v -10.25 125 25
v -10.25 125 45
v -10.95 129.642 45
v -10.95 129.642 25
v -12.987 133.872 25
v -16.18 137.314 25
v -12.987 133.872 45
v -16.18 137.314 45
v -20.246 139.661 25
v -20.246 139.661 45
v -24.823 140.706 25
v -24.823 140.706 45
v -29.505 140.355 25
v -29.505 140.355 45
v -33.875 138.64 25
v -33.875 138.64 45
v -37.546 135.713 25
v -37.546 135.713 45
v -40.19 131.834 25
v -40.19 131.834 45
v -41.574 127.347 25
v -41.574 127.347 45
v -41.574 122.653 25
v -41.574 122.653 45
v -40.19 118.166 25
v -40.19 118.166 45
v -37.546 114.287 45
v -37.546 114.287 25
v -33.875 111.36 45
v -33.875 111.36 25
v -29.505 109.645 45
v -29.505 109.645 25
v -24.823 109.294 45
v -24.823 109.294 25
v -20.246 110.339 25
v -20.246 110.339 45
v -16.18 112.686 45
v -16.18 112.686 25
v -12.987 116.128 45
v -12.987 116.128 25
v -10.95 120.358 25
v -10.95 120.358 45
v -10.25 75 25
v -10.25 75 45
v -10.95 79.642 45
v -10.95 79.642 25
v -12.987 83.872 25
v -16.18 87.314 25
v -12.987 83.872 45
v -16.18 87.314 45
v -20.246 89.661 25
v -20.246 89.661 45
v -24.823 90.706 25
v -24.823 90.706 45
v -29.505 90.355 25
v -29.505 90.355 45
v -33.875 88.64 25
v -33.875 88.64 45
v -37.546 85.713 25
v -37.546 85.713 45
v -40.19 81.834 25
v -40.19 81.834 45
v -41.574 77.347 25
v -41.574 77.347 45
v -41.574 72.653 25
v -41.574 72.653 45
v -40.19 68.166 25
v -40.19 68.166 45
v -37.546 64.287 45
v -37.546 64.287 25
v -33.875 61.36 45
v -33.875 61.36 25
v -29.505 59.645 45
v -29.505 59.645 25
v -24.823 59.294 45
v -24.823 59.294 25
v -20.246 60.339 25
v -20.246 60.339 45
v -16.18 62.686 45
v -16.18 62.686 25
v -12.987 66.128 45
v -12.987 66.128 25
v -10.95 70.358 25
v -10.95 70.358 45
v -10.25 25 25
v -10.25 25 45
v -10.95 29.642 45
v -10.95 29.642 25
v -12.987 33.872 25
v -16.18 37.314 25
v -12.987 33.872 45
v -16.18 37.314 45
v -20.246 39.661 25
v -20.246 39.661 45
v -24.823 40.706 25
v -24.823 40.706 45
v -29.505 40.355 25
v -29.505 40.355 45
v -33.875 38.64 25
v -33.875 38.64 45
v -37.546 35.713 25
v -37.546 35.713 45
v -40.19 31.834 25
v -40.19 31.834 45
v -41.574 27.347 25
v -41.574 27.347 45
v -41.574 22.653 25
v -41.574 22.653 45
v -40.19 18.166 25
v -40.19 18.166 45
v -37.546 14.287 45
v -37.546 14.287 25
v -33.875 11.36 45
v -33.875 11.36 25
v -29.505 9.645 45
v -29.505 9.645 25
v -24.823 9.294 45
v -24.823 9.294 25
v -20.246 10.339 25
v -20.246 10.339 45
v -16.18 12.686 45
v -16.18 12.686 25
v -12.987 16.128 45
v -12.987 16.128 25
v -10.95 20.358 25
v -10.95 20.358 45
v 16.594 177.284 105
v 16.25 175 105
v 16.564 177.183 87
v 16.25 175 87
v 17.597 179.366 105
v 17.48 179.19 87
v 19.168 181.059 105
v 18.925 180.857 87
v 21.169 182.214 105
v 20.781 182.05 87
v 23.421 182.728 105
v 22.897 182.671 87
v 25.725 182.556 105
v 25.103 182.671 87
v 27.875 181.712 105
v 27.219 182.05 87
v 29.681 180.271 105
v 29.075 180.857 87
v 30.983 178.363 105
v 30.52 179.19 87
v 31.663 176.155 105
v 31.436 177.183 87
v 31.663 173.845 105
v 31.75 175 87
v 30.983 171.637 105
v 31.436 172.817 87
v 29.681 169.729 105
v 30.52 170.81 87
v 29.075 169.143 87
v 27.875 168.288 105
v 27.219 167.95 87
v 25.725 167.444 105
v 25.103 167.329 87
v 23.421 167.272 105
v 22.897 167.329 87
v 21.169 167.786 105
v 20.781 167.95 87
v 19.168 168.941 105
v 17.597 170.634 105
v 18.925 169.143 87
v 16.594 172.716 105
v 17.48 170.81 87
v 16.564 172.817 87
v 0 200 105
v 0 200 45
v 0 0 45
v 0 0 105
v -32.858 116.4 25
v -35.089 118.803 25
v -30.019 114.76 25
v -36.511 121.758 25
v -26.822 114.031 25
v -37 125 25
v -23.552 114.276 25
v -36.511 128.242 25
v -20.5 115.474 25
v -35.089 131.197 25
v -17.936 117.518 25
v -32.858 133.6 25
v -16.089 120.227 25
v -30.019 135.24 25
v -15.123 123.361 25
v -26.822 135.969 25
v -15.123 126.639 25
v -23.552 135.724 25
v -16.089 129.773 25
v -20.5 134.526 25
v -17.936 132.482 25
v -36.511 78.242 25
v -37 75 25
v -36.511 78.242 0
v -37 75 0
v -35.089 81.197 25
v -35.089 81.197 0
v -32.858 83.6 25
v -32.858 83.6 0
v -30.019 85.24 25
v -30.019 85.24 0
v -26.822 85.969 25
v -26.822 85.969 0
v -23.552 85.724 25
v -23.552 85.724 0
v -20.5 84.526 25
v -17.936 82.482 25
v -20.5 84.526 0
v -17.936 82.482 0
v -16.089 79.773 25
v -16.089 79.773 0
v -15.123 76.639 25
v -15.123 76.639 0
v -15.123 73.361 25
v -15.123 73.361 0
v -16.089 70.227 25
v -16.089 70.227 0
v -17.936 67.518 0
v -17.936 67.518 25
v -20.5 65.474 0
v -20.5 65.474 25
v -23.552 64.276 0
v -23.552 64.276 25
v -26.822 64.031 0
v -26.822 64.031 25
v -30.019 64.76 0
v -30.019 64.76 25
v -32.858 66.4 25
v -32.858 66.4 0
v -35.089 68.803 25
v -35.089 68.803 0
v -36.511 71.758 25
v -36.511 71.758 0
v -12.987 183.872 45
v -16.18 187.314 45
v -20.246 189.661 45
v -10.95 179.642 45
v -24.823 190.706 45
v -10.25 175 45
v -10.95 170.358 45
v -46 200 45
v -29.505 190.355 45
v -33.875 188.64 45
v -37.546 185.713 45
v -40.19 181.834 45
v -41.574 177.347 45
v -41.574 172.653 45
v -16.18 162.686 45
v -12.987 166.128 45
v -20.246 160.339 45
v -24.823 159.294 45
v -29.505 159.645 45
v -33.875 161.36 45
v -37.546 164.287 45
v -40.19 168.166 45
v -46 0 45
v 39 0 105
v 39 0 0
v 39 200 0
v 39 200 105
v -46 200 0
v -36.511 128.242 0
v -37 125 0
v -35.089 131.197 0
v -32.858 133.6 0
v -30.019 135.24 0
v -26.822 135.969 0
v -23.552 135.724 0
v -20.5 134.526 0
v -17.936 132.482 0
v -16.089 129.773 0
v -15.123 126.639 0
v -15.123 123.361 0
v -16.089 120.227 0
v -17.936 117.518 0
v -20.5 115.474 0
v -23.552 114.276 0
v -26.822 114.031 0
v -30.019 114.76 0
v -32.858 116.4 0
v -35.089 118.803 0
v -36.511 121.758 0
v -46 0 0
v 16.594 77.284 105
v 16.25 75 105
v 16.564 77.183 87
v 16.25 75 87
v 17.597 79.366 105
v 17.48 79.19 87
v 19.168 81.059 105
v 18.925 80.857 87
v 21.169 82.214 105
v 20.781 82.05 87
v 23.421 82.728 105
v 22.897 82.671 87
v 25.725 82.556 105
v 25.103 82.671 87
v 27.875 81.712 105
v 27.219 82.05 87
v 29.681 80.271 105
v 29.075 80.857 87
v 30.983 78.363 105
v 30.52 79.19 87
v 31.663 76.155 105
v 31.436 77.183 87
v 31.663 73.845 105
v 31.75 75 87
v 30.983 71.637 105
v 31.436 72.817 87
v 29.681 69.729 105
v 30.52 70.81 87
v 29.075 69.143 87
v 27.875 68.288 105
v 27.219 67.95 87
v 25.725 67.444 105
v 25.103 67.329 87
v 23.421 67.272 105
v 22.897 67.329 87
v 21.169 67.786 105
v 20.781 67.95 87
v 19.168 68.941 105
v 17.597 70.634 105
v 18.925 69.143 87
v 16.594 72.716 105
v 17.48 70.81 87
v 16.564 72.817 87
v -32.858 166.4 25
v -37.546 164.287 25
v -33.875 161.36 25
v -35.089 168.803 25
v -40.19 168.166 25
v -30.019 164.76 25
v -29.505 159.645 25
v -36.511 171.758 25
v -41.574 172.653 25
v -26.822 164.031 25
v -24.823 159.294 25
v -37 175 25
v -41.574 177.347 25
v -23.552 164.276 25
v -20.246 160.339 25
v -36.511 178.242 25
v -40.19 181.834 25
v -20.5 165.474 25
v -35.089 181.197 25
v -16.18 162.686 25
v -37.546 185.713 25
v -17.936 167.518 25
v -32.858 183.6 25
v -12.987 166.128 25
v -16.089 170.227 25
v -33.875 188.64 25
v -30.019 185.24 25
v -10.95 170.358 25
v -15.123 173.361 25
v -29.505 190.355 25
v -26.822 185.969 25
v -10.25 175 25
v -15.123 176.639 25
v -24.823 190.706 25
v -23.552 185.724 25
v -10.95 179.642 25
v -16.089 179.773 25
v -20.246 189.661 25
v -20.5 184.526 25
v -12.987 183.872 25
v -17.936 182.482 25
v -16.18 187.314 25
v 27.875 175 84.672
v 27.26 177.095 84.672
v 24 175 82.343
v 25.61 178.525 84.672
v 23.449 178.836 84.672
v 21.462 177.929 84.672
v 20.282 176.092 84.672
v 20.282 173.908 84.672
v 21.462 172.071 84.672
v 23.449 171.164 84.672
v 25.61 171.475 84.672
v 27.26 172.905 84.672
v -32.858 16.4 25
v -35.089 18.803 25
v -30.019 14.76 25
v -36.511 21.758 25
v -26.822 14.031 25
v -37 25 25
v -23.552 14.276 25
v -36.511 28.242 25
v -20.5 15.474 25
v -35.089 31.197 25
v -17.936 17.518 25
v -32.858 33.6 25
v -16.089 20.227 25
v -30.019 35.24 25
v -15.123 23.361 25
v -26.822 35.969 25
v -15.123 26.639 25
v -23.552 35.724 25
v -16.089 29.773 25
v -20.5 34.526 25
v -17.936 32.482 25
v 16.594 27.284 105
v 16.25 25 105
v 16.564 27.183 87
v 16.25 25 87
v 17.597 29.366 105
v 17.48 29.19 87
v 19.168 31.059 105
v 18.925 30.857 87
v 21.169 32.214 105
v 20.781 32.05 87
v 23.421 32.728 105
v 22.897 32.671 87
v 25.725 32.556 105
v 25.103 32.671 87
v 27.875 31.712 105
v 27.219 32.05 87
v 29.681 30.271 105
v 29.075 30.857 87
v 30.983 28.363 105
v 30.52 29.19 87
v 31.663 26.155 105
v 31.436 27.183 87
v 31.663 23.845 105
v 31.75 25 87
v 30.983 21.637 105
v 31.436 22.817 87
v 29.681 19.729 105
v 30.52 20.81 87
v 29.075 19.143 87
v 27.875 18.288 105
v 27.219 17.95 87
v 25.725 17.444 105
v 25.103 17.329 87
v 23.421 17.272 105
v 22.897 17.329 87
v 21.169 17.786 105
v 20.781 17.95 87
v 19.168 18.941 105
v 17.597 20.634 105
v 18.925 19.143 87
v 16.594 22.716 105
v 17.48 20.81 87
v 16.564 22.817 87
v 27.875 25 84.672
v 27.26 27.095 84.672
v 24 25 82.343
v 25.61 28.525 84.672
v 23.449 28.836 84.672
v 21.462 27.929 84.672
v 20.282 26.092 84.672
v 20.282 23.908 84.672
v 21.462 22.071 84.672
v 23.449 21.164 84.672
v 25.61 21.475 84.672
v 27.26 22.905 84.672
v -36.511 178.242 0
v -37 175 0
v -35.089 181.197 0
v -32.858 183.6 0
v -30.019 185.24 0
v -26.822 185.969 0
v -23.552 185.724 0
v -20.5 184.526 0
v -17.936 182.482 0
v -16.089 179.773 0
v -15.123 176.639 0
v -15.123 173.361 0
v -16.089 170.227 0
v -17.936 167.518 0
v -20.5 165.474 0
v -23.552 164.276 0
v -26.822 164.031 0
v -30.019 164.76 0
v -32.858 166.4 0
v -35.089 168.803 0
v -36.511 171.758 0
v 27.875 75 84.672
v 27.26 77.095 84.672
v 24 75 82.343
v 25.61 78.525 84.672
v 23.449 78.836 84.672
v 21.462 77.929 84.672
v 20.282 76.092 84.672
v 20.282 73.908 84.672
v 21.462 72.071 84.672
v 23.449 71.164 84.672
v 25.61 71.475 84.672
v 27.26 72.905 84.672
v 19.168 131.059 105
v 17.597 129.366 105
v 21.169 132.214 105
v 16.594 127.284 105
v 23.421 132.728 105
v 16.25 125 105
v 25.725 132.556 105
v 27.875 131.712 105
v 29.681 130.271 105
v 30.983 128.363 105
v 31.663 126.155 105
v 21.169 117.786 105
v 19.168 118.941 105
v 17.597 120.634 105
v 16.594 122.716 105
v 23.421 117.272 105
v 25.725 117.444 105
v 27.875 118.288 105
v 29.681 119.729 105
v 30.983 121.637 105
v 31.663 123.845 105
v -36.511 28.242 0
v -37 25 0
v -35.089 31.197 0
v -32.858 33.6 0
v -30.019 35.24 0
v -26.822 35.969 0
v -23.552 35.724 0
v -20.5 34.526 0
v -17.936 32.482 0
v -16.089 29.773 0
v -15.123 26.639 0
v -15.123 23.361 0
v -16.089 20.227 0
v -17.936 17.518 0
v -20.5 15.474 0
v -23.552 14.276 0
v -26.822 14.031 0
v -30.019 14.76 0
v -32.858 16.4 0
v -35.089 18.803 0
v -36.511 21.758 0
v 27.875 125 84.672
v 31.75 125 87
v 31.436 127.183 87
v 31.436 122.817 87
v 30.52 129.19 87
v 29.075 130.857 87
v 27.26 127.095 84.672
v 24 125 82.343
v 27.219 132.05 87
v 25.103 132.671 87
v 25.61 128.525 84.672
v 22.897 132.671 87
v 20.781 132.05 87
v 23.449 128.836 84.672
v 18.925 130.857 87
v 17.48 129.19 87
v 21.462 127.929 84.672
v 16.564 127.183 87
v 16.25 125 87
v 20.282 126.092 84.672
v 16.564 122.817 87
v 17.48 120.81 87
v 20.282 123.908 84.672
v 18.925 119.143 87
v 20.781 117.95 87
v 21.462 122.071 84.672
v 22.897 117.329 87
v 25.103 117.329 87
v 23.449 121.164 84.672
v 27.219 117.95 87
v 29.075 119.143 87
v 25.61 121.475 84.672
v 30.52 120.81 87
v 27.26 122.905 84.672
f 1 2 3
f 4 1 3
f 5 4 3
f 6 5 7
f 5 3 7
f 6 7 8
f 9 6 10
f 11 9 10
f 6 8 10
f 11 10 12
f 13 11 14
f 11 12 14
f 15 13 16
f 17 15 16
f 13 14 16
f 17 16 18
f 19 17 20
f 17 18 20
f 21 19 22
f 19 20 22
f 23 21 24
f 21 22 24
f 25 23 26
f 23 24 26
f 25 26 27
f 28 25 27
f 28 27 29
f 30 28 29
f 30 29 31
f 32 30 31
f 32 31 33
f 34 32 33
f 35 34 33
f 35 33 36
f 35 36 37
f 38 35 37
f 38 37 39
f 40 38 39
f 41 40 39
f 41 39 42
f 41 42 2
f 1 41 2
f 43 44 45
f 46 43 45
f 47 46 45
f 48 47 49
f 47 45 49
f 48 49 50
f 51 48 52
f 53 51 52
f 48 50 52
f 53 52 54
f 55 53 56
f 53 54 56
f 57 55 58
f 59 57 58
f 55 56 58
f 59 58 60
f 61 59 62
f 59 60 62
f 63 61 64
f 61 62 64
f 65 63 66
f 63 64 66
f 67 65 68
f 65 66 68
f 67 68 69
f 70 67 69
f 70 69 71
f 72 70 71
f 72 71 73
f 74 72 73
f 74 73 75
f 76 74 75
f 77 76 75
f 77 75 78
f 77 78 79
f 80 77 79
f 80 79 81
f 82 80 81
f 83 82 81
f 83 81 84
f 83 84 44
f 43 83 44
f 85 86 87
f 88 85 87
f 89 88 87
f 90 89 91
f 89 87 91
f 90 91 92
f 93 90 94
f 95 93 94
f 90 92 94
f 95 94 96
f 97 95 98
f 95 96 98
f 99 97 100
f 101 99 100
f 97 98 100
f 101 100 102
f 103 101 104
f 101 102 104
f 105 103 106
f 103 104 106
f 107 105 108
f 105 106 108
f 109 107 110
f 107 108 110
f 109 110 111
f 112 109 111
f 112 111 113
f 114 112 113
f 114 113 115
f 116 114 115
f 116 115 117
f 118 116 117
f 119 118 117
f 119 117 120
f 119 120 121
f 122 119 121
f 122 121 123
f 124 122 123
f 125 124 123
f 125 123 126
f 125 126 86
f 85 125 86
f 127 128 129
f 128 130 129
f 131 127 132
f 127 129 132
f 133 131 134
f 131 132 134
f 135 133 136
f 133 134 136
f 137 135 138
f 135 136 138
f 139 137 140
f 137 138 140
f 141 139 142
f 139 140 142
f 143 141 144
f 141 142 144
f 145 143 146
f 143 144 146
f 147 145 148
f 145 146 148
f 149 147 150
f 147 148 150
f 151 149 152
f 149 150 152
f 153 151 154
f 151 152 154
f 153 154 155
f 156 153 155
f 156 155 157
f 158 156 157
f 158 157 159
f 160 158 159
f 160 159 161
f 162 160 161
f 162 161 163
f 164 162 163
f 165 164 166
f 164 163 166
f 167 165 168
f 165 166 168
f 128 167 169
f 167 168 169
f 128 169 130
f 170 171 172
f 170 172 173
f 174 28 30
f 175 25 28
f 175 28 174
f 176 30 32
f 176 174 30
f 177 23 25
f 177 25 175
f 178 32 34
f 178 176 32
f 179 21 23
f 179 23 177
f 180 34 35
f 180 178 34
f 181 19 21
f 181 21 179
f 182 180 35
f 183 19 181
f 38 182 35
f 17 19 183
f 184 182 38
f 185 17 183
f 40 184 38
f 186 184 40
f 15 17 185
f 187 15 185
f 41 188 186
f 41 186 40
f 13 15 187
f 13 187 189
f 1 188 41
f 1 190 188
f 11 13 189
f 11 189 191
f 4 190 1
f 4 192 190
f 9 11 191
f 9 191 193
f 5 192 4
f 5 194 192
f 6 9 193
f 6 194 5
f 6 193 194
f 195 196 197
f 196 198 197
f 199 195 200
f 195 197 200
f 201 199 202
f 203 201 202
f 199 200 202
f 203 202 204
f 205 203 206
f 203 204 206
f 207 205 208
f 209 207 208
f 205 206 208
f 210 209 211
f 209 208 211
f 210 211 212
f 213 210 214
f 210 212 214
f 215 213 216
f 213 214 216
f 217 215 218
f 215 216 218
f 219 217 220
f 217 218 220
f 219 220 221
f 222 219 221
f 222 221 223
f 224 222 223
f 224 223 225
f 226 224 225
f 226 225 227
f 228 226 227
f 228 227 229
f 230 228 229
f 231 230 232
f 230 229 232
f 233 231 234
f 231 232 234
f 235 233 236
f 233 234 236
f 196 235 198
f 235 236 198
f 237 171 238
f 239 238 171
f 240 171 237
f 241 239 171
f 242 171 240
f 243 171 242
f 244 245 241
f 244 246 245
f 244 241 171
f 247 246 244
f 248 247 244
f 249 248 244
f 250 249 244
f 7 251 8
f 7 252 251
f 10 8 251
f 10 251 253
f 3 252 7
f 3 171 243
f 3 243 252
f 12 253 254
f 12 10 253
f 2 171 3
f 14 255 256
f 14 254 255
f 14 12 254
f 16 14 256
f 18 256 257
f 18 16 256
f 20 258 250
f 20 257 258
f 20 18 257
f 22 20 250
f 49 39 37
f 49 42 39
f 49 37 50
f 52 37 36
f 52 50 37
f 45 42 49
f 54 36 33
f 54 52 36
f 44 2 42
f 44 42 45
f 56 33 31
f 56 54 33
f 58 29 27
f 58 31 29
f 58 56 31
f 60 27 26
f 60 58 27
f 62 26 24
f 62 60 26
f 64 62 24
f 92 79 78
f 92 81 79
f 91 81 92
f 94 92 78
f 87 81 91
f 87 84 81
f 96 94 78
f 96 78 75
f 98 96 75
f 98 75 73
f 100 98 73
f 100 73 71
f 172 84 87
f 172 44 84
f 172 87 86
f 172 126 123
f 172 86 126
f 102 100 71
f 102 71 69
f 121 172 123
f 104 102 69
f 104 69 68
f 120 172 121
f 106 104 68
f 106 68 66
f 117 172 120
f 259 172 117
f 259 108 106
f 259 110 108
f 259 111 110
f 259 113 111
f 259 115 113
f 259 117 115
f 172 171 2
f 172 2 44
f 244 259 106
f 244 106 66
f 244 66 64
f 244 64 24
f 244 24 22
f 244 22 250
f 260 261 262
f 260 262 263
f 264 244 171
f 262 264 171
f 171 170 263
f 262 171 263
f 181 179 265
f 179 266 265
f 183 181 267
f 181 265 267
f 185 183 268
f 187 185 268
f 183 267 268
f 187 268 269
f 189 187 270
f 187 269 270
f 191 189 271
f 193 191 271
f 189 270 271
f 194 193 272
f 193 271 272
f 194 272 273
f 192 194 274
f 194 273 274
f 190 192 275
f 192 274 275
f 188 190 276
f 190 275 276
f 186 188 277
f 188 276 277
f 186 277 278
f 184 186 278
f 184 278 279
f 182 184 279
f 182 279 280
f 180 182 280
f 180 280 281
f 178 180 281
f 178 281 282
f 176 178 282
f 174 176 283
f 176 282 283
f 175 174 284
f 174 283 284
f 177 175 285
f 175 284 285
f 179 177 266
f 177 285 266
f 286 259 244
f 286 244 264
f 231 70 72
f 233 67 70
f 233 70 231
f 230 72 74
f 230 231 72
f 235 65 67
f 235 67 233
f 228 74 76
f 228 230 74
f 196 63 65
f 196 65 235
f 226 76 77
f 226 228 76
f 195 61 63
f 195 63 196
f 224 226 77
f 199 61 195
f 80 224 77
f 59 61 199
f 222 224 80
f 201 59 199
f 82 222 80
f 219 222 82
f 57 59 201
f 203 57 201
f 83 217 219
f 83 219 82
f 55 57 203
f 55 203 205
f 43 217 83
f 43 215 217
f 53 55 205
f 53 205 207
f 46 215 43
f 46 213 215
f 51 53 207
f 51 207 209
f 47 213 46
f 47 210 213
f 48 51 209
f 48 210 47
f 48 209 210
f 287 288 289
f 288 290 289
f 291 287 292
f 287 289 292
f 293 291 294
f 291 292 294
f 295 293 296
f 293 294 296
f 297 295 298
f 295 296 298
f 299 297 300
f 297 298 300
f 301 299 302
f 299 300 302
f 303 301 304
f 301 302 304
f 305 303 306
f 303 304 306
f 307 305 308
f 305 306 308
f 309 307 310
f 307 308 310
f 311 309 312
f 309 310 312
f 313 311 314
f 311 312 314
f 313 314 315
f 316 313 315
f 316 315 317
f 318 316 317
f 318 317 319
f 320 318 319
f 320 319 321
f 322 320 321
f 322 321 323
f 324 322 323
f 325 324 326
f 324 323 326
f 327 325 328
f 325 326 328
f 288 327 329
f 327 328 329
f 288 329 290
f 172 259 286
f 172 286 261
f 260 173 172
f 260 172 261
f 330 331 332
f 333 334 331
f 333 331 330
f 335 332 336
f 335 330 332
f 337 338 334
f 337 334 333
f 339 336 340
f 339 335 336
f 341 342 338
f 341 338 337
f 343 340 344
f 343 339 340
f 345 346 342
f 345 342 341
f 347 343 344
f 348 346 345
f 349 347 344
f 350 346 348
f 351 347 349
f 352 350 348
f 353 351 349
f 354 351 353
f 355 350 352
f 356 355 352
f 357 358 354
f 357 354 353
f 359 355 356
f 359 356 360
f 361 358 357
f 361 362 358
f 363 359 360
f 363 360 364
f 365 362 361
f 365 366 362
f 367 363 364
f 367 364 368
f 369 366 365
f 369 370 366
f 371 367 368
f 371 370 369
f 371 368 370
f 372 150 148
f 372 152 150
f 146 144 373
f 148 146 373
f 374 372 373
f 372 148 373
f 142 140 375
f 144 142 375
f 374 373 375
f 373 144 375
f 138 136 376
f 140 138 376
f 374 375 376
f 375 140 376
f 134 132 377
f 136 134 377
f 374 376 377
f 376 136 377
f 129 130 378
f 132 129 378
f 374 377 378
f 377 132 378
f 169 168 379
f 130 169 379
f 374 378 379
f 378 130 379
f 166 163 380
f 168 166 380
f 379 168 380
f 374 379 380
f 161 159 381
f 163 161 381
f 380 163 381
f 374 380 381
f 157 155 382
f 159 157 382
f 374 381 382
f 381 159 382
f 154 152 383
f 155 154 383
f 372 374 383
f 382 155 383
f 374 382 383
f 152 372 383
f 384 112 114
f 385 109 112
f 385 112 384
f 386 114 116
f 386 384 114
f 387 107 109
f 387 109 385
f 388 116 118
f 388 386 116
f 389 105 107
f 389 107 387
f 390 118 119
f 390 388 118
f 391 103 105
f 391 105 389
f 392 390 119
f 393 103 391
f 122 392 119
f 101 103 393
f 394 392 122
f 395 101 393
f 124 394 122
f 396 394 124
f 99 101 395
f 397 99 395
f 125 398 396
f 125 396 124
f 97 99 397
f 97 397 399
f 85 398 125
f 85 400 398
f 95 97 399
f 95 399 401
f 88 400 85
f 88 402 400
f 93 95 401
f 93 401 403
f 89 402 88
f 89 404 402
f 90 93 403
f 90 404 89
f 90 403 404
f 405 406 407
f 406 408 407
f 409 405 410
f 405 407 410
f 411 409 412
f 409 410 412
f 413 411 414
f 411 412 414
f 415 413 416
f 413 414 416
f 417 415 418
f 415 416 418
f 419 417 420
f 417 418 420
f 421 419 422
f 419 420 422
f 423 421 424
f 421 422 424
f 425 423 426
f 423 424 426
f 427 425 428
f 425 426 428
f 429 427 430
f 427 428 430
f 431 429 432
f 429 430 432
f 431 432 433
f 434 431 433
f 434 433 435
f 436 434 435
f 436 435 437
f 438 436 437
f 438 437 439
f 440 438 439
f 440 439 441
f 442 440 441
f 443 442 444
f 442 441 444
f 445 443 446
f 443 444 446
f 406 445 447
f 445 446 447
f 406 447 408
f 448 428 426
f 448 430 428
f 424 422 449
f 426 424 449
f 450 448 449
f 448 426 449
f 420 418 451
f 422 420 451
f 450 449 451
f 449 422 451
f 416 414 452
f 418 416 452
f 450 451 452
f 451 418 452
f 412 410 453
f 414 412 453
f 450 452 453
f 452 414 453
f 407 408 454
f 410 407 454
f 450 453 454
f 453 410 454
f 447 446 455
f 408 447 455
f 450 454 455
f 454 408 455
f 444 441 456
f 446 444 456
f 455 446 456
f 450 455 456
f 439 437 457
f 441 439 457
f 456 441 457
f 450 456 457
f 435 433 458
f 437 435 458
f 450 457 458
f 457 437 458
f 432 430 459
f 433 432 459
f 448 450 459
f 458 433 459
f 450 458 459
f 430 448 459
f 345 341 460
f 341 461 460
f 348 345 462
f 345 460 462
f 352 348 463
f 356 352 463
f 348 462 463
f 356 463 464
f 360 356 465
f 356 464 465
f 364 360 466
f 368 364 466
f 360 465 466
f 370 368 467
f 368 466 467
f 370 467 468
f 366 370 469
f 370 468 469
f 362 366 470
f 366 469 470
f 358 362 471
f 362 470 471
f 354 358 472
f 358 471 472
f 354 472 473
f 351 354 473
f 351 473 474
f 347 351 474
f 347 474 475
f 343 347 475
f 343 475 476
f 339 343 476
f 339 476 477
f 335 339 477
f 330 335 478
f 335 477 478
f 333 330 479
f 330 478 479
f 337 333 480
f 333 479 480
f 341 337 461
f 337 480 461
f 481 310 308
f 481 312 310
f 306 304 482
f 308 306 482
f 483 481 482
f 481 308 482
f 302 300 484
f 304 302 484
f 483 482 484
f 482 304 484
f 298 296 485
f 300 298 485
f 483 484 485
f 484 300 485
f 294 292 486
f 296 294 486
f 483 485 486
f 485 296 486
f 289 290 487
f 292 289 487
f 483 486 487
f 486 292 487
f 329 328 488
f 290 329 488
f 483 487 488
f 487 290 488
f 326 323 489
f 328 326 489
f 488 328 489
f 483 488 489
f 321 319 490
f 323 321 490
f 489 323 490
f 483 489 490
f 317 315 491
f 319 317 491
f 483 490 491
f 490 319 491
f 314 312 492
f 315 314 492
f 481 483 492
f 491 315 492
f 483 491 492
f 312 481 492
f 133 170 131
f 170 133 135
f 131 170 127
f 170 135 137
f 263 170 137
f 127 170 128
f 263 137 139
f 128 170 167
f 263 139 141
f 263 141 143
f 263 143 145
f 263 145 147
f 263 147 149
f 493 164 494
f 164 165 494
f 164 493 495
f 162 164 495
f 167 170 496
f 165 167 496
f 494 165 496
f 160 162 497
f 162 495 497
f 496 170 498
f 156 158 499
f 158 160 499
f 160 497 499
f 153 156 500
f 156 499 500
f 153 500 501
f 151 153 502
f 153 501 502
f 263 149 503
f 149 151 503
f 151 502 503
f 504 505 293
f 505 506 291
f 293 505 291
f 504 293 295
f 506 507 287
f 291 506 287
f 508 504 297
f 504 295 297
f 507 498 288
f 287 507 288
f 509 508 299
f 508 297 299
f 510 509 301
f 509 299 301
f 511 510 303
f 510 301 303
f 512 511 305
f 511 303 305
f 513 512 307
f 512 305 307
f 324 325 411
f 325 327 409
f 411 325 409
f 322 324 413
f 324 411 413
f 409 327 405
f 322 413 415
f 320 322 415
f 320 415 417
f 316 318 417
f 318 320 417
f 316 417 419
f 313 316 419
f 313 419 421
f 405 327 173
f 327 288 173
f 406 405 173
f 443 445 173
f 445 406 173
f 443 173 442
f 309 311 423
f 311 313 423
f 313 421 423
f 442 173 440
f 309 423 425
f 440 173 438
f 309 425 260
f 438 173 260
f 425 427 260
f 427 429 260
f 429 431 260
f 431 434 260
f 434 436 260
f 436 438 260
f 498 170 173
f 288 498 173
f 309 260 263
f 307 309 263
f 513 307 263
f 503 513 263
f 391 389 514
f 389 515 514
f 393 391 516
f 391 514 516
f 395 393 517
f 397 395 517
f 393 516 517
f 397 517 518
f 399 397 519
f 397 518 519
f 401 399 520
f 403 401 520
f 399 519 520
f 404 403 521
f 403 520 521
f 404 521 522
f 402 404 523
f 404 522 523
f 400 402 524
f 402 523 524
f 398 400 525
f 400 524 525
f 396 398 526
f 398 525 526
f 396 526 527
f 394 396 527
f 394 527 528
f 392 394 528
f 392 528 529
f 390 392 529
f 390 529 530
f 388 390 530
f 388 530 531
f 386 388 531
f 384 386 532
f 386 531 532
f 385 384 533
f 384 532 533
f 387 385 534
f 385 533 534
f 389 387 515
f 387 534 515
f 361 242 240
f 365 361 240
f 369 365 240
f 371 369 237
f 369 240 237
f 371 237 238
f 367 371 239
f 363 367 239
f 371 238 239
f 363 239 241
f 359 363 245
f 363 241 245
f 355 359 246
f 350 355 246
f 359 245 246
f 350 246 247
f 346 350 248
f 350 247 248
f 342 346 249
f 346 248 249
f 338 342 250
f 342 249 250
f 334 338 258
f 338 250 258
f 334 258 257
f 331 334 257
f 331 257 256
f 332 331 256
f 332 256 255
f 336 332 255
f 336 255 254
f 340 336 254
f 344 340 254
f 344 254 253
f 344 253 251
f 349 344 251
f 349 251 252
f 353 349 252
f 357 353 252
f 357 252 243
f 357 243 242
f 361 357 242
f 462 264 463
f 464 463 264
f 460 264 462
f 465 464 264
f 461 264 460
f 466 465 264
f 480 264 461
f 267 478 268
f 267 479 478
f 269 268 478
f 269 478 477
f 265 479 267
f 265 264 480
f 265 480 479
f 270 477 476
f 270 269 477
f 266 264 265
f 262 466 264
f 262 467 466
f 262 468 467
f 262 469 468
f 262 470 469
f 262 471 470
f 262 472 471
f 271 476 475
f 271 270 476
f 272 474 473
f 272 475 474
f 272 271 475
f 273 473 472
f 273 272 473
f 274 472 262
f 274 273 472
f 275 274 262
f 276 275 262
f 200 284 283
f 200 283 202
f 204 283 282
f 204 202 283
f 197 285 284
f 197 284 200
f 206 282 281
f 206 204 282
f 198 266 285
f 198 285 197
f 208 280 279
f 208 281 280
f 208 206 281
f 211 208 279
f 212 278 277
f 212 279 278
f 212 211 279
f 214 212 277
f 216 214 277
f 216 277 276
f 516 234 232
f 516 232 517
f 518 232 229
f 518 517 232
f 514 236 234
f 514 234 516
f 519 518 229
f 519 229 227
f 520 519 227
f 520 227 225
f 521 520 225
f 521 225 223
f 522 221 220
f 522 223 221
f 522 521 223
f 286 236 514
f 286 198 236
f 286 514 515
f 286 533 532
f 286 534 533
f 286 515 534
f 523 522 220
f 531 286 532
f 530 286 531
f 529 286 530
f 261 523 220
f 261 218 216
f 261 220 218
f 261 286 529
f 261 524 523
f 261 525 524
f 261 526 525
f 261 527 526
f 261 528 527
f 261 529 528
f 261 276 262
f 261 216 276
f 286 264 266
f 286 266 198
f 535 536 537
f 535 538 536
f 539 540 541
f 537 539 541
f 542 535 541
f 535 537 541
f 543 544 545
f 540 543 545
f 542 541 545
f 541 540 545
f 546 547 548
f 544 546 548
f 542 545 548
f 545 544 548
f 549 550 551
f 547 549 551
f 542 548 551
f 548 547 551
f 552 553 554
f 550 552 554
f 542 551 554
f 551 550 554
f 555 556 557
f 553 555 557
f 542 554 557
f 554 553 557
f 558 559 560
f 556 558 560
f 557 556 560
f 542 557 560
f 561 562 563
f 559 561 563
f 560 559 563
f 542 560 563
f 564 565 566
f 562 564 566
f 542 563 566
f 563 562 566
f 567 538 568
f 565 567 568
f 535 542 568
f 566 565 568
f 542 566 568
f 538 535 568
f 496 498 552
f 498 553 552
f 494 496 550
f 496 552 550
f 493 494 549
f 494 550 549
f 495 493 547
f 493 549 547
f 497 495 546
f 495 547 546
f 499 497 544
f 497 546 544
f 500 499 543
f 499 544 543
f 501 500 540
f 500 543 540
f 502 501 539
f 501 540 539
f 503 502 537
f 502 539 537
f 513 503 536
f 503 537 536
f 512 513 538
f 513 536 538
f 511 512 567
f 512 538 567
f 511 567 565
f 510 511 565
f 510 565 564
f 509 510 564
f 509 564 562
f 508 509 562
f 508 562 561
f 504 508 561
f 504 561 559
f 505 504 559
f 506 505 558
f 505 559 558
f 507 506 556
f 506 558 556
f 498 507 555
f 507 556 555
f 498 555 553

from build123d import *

# Parameters (mm, degrees)
F0_W           = 39
F0_H           = 60
F1_DEPTH       = 200
F4_D           = 15.5
F4_DEPTH       = 18
F4_TIP         = 4.6566697975
F5_D           = 22
F5_CBORE_D     = 31.5
F5_CBORE_DEPTH = 20


# Not quite as in the source:
# - a feature names something its author has since deleted; it is built from what else it names


with BuildPart() as f1:
    # F0 (on Front) → F1 (new body)
    with BuildSketch(Plane.XZ):
        with Locations((19.5, 75)):
            Rectangle(F0_W, F0_H)
        Polygon((0, 45), (-46, 45), (-46, 0), (39, 0), (39, 45), align=None)
    extrude(amount=-F1_DEPTH)

    # F4
    with Locations(Plane.XY.offset(105)):
        with Locations((24, 25), (24, 75), (24, 125), (24, 175)):
            Hole(F4_D / 2, depth=F4_DEPTH)
            with Locations((0, 0, -(F4_DEPTH + F4_TIP / 2))):  # 118° drill point
                Cone(0, F4_D / 2, F4_TIP, mode=Mode.SUBTRACT)

    # F5 (through all)
    with Locations(Plane.XY.offset(45)):
        with Locations((-26, 25), (-26, 75), (-26, 125), (-26, 175)):
            CounterBoreHole(F5_D / 2, F5_CBORE_D / 2, F5_CBORE_DEPTH)


solid = f1.part
